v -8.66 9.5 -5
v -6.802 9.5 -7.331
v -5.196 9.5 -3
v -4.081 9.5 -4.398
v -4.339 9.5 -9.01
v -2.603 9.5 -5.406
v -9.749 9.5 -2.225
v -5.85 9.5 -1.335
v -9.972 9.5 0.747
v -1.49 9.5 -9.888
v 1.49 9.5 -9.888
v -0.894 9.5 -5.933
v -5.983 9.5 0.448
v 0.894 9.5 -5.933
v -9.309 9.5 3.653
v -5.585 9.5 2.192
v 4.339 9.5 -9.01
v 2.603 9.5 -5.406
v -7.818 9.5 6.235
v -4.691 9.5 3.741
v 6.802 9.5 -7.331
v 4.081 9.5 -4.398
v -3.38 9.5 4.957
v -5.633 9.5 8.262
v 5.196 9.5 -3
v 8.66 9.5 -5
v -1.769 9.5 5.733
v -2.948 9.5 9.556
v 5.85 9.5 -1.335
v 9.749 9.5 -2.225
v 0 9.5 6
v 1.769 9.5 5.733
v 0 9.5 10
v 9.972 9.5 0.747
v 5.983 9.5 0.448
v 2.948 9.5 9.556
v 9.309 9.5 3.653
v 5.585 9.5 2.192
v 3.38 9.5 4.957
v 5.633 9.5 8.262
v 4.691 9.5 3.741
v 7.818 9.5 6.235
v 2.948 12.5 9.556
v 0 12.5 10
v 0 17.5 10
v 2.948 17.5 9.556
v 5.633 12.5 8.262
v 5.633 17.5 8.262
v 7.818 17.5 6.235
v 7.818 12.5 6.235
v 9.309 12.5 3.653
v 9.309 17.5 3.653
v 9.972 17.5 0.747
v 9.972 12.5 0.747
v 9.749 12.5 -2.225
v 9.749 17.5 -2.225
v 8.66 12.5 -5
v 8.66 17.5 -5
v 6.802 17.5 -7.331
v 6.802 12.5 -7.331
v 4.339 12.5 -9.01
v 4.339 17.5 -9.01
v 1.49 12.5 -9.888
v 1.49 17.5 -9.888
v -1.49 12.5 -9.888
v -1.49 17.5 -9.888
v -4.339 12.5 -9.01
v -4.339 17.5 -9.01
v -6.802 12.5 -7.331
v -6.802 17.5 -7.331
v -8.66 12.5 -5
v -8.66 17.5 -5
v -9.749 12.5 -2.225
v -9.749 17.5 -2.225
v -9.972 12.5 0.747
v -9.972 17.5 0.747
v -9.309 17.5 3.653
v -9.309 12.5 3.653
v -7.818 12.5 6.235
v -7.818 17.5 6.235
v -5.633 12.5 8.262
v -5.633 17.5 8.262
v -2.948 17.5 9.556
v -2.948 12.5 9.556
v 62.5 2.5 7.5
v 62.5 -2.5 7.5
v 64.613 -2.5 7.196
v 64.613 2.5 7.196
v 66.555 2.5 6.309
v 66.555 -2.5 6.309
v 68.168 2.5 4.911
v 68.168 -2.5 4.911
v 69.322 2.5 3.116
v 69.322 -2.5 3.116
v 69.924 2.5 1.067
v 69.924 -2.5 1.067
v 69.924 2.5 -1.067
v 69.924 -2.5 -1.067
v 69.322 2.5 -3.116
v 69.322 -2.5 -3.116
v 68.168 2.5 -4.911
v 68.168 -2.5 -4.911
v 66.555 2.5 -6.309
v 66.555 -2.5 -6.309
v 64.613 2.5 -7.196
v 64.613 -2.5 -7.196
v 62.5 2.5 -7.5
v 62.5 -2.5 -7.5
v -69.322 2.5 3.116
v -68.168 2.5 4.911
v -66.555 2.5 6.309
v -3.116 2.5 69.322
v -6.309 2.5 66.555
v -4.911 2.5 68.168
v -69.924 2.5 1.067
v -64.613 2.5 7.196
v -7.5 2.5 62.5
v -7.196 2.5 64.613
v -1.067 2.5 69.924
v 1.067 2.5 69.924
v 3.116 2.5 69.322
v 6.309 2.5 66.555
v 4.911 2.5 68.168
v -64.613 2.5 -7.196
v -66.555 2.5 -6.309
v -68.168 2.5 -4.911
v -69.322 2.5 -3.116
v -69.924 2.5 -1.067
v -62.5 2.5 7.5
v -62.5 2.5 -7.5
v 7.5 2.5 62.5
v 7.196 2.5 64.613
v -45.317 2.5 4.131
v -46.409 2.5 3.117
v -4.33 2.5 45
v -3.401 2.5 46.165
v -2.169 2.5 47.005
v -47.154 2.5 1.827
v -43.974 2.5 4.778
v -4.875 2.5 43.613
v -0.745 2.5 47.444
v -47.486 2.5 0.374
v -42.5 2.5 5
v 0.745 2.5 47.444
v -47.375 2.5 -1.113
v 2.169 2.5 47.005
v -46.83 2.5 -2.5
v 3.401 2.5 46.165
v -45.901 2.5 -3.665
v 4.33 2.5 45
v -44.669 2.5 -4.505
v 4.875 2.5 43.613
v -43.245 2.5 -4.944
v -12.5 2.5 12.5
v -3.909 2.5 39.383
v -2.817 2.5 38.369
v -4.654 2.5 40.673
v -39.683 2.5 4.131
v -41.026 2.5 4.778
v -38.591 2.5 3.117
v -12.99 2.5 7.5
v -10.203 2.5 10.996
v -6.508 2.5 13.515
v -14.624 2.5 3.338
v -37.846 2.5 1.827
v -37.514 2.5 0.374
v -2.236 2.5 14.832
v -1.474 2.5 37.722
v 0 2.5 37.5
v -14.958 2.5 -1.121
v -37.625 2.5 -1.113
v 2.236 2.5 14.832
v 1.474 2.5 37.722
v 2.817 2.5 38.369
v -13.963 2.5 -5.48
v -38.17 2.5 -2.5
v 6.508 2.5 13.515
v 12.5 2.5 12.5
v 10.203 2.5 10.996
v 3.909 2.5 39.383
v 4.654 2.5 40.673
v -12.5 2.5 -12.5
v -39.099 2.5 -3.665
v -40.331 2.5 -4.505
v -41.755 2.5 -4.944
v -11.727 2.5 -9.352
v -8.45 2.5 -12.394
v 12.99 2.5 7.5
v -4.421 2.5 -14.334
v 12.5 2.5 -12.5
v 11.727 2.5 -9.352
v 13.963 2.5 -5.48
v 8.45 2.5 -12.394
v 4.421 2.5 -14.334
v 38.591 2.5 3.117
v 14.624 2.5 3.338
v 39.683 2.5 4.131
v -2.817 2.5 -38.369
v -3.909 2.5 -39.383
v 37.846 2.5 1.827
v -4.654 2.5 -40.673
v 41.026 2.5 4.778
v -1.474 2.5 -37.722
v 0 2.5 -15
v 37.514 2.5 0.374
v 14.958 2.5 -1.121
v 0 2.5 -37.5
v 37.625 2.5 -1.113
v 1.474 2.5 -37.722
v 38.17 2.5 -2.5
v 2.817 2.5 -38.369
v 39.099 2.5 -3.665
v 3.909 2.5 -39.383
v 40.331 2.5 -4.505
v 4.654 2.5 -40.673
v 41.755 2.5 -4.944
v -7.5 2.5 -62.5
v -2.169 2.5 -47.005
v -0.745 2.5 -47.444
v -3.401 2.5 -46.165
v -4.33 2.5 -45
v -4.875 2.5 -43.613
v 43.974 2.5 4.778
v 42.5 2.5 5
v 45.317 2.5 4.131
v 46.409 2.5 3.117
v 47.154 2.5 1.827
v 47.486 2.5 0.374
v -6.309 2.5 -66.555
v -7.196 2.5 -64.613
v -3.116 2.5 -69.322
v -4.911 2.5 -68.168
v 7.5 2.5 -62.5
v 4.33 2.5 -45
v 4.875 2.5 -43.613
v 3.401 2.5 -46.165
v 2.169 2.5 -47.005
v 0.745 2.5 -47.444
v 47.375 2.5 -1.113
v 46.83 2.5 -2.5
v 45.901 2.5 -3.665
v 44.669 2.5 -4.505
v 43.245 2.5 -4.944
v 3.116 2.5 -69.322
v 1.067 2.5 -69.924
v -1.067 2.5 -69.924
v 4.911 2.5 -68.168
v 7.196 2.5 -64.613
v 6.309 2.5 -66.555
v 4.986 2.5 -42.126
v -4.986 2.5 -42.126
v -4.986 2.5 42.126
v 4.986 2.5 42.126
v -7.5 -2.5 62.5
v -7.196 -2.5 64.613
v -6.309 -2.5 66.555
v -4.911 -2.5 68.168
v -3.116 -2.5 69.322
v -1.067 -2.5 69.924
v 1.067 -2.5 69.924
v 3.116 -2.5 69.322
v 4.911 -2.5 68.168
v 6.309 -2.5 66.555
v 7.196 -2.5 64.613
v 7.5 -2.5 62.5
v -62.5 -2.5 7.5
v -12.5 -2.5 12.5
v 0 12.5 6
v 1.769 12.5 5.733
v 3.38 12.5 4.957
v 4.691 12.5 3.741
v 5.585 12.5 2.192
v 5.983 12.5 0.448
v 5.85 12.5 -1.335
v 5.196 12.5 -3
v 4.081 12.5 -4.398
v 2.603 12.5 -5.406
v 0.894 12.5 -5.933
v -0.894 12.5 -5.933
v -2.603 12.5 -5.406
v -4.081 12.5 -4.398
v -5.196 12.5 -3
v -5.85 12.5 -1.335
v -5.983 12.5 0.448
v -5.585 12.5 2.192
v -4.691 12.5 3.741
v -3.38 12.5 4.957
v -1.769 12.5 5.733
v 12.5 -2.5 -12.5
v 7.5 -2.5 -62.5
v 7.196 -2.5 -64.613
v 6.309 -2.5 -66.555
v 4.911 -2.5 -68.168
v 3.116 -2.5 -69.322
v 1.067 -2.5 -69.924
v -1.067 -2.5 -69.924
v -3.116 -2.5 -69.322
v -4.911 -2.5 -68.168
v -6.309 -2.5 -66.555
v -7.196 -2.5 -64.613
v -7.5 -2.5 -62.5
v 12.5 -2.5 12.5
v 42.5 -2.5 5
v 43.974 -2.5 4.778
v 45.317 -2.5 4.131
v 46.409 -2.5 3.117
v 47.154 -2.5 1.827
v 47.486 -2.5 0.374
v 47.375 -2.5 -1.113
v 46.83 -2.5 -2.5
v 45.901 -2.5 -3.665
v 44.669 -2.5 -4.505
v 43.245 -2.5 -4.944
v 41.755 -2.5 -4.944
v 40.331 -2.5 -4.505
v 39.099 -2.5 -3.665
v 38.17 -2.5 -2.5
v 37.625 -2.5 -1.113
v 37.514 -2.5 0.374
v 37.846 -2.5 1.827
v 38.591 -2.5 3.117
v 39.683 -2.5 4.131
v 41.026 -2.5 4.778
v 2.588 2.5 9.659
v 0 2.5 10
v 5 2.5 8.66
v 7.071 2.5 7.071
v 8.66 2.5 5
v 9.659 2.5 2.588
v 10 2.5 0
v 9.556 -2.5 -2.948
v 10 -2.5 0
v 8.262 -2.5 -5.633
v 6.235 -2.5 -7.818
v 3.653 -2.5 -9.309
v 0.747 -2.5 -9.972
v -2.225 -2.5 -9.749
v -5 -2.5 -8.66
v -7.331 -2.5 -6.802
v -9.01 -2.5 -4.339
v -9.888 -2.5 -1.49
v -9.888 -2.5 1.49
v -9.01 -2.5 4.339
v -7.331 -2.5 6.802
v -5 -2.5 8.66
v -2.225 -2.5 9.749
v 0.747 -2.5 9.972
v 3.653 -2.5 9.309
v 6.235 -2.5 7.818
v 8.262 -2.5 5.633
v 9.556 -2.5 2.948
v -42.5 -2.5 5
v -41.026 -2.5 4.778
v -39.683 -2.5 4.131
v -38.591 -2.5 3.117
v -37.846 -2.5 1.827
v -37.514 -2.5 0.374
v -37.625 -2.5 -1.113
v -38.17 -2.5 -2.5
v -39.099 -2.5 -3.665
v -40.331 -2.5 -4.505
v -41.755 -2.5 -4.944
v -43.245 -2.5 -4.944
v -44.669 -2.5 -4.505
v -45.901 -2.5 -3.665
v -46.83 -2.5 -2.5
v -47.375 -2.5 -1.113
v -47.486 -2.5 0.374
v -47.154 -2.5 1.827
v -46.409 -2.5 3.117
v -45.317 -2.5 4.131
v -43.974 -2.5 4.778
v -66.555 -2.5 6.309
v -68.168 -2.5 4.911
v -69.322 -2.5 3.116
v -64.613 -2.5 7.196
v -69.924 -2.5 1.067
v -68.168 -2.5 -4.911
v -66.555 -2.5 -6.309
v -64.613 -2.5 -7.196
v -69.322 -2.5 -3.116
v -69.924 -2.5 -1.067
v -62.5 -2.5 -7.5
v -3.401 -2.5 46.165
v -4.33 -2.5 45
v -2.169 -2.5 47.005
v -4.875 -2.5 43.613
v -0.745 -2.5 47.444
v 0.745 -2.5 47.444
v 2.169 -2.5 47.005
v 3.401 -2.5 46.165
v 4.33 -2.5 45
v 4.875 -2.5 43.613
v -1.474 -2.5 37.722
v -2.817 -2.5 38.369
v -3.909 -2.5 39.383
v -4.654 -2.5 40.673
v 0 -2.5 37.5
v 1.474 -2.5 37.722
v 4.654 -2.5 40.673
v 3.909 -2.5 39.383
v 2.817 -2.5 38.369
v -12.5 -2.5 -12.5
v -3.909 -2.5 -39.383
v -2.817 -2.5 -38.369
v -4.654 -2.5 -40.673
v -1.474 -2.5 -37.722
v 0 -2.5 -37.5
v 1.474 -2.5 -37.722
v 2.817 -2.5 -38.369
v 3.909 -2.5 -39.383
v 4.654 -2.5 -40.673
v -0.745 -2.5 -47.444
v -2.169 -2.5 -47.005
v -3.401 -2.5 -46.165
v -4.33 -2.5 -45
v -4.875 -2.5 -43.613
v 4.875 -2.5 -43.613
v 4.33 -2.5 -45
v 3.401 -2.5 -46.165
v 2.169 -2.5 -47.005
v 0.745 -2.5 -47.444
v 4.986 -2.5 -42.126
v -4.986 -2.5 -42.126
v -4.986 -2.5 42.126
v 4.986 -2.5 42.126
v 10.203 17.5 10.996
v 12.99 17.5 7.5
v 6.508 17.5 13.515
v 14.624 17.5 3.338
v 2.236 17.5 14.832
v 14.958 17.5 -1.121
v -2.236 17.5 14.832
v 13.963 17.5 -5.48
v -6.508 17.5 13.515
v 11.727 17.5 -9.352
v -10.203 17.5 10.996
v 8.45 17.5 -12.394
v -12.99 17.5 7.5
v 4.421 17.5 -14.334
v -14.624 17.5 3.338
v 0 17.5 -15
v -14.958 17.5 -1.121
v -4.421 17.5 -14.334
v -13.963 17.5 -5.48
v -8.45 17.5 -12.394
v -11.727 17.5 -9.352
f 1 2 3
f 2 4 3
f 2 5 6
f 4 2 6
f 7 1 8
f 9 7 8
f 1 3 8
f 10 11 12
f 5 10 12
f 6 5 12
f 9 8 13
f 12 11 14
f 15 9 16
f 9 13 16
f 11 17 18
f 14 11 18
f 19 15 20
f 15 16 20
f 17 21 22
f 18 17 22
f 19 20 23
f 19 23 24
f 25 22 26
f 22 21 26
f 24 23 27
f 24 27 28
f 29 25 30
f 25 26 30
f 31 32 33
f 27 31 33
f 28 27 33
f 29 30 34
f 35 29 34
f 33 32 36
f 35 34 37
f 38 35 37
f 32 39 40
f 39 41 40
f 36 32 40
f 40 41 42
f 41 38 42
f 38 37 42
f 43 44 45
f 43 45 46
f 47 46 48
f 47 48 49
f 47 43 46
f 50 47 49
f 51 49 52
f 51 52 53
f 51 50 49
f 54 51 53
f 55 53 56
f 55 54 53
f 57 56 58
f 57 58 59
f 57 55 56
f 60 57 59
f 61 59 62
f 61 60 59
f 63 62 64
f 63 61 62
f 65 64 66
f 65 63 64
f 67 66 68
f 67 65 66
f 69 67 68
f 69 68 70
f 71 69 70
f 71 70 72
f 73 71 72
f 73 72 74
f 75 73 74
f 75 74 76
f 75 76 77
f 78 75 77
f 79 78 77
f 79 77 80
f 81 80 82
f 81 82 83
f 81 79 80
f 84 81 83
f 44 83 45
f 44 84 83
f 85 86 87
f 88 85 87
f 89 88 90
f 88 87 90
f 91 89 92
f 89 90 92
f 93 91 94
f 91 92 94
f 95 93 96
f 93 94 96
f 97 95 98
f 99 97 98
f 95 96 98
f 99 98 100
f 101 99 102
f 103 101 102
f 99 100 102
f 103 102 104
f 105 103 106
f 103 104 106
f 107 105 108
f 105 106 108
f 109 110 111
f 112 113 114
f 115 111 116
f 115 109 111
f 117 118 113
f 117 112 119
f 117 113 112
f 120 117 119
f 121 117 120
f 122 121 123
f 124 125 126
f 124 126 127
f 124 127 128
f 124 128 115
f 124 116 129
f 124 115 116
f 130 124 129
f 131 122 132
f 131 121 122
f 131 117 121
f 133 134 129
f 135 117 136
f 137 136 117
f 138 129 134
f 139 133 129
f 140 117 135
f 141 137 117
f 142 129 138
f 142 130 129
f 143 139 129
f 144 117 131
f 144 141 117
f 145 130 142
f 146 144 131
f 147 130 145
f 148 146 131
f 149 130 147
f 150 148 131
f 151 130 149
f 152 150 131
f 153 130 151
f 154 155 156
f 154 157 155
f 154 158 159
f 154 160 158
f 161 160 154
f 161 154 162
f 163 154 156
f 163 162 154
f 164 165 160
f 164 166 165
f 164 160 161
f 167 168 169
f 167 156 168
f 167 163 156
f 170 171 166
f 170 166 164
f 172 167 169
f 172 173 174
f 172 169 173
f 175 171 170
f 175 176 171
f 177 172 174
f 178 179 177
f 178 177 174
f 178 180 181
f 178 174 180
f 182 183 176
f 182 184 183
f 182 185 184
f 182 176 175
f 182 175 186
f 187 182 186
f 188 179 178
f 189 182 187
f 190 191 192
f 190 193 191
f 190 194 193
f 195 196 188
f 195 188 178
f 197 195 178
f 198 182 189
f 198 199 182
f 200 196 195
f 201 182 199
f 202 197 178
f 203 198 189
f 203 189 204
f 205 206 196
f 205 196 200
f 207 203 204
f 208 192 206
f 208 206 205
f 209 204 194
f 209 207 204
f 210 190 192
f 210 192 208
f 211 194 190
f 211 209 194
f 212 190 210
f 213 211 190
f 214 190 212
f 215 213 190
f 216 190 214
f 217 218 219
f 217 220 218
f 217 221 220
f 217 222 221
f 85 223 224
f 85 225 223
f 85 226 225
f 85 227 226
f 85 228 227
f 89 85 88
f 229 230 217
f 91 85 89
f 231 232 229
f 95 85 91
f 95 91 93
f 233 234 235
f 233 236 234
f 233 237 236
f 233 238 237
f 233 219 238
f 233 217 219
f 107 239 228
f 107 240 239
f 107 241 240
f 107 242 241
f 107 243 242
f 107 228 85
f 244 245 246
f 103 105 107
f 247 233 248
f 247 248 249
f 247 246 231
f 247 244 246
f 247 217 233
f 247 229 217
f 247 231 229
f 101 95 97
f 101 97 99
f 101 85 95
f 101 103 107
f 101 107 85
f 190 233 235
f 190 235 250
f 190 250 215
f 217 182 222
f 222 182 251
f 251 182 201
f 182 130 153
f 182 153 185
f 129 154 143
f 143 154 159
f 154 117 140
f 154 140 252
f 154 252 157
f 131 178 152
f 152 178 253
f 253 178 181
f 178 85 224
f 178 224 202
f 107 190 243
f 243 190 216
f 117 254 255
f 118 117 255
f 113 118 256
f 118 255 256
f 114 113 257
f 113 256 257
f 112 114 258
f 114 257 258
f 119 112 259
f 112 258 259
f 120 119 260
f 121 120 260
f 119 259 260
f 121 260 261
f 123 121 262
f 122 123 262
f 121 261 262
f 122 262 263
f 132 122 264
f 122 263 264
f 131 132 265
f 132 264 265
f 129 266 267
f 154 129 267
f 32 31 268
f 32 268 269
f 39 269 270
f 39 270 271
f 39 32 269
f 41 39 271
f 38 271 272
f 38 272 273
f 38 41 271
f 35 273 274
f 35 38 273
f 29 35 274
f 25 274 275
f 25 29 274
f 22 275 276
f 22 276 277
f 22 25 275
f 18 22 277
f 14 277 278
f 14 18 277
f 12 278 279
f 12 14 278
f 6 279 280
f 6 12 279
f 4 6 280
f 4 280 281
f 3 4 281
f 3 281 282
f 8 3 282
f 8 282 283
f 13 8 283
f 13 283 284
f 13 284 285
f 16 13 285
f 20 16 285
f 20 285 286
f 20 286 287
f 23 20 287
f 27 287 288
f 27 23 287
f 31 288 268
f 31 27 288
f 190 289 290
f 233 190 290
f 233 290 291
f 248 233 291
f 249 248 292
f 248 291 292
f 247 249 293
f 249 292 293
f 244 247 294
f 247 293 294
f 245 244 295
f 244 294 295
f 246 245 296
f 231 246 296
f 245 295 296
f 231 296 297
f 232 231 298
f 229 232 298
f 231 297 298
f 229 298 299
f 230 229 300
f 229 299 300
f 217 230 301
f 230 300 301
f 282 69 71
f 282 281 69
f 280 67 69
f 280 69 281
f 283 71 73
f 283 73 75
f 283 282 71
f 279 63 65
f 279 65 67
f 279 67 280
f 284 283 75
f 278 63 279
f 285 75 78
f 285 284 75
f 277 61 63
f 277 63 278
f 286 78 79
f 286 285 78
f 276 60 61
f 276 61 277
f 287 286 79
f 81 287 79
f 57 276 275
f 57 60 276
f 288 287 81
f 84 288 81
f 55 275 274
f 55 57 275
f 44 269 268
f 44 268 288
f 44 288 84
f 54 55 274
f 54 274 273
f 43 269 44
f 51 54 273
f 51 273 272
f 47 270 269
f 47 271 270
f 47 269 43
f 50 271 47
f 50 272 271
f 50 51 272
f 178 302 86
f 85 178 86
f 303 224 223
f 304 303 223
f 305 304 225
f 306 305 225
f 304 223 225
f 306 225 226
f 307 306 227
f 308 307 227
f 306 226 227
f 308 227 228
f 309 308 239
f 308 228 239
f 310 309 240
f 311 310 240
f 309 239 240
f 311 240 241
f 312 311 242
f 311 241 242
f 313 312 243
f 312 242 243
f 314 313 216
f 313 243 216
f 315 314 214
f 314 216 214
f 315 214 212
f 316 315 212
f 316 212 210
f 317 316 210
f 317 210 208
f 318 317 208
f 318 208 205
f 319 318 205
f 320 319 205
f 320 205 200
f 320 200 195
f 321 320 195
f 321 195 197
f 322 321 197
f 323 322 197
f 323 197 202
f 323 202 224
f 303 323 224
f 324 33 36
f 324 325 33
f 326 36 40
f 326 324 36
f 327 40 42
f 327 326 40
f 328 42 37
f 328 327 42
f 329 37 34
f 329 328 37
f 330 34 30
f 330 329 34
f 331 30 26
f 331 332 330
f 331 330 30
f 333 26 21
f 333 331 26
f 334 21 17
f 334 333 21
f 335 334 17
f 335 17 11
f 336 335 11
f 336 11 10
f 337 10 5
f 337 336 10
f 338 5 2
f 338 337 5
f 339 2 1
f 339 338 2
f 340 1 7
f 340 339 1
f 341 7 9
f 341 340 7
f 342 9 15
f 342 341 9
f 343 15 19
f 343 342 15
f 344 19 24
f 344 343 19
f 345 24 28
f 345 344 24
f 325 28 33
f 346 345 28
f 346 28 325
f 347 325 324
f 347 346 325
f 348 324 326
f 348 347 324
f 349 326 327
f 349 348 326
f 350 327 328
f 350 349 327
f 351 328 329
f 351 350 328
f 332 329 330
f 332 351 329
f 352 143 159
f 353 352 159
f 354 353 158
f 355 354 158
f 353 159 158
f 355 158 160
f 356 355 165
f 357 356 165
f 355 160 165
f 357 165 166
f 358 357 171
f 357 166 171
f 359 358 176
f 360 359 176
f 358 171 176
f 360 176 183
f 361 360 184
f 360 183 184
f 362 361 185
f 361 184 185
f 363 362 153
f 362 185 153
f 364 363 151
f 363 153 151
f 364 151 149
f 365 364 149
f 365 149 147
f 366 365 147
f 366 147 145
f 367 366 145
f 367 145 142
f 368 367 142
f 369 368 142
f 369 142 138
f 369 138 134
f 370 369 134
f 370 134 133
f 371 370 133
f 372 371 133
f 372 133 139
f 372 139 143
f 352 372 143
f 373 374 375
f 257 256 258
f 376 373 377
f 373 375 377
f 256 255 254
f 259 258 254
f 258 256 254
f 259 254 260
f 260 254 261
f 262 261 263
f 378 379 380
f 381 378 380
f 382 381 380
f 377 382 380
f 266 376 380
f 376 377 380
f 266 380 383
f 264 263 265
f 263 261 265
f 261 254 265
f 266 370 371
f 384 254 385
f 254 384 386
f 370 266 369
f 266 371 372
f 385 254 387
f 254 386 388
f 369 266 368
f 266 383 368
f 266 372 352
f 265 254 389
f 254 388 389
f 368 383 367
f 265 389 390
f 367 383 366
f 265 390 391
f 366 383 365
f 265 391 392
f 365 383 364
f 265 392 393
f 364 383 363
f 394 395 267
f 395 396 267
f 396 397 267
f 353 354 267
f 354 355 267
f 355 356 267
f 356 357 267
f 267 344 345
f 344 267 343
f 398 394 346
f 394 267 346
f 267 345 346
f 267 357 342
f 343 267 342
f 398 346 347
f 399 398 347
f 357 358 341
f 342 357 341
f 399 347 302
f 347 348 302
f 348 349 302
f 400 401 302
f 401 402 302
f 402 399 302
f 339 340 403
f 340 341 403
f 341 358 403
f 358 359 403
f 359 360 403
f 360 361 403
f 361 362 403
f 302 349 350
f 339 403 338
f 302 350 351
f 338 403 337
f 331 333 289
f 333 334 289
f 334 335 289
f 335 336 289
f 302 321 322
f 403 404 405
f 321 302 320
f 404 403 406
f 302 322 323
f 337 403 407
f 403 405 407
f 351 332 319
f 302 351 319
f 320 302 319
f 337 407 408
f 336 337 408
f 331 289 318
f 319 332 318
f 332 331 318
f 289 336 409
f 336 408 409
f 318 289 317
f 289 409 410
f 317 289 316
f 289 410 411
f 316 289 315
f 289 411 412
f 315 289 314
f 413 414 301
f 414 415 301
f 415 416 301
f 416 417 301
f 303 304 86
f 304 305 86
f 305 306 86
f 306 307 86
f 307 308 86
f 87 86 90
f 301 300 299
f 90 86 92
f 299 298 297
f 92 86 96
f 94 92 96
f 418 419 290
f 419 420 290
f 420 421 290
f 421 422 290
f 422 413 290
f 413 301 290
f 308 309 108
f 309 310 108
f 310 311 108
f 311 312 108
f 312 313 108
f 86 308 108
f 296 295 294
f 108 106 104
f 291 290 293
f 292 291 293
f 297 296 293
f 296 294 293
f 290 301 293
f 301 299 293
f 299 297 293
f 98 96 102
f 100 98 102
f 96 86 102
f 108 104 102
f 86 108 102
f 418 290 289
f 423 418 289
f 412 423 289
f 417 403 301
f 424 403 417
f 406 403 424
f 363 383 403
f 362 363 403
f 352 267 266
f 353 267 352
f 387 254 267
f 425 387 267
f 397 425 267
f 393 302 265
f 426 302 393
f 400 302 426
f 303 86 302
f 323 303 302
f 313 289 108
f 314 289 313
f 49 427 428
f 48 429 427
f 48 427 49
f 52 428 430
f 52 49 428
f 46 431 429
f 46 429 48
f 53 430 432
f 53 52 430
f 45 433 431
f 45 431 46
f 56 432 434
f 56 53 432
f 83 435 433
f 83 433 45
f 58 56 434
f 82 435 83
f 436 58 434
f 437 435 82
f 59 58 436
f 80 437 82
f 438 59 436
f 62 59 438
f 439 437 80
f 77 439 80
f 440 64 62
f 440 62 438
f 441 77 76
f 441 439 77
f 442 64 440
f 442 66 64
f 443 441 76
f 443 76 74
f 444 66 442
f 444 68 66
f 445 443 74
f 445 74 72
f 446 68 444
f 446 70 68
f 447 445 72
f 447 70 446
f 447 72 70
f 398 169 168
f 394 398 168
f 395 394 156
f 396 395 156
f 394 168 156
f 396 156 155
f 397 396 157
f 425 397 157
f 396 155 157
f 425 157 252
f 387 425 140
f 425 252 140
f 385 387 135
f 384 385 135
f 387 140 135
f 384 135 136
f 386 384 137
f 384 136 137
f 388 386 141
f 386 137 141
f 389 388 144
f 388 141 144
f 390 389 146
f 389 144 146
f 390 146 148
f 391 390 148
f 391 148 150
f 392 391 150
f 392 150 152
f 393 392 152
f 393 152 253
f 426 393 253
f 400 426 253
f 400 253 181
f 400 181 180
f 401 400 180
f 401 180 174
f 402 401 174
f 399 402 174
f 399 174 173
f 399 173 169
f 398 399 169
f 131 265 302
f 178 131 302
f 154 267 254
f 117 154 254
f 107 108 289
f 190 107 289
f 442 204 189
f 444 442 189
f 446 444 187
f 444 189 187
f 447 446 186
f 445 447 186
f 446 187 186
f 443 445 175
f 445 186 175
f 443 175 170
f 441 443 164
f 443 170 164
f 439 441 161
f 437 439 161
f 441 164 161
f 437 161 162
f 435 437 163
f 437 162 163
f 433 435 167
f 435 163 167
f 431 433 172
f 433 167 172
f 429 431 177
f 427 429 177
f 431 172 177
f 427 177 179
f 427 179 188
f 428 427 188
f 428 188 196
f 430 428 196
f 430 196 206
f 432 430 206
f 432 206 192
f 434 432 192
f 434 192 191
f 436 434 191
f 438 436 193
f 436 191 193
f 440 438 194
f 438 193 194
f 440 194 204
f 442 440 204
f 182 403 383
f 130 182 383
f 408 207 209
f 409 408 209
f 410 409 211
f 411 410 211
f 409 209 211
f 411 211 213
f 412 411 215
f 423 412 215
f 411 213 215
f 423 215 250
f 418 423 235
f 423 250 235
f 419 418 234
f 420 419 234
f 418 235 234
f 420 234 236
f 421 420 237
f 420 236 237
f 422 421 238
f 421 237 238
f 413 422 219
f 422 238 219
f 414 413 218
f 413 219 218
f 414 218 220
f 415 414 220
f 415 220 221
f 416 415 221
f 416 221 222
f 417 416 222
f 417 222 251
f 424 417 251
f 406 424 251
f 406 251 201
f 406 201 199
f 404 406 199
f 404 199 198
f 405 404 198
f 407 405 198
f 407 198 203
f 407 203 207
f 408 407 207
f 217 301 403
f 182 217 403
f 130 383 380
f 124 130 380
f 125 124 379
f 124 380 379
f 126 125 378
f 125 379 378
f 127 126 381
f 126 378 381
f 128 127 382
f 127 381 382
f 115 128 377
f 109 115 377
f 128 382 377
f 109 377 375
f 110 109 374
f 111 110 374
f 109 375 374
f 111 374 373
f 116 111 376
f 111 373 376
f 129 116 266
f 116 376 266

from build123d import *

# Parameters (mm, degrees)
BOSS_EXTRUDE1_START     = -2.5
BOSS_EXTRUDE1_OUTLINE_R = 10
BOSS_EXTRUDE1_DEPTH     = 5
SKETCH2_R               = 15
SKETCH2_R_2             = 10
BOSS_EXTRUDE2_DEPTH     = 15
SKETCH3_R               = 5
CUT_EXTRUDE1_DEPTH      = 101.124921973
BOSS_EXTRUDE3_START     = 9.5
SKETCH4_R               = 10
SKETCH4_R_2             = 6
BOSS_EXTRUDE3_DEPTH     = 3


# Read off the part's stored shape, not the designer's step: Boss-Extrude1
with BuildPart() as part:
    # Boss-Extrude1 outline → Boss-Extrude1 (new body)
    with BuildSketch(Plane(origin=(0, 0, 0), x_dir=(1, 0, 0), z_dir=(0, 1, 0)).offset(BOSS_EXTRUDE1_START)):
        with BuildLine():
            Line((12.5, 12.5), (7.5, 62.5))
            ThreePointArc((7.5, 62.5), (0, 70), (-7.5, 62.5))
            Line((-7.5, 62.5), (-12.5, 12.5))
            Line((-12.5, 12.5), (-62.5, 7.5))
            ThreePointArc((-62.5, 7.5), (-70, 0), (-62.5, -7.5))
            Line((-62.5, -7.5), (-12.5, -12.5))
            Line((-12.5, -12.5), (-7.5, -62.5))
            ThreePointArc((-7.5, -62.5), (0, -70), (7.5, -62.5))
            Line((7.5, -62.5), (12.5, -12.5))
            Line((12.5, -12.5), (62.5, -7.5))
            ThreePointArc((62.5, -7.5), (70, 0), (62.5, 7.5))
            Line((62.5, 7.5), (12.5, 12.5))
        make_face()
        Circle(BOSS_EXTRUDE1_OUTLINE_R, mode=Mode.SUBTRACT)
    extrude(amount=BOSS_EXTRUDE1_DEPTH)

    # Sketch2 → Boss-Extrude2 (add)
    with BuildSketch(Plane(origin=(0, 2.5, 0), x_dir=(1, 0, 0), z_dir=(0, 1, 0))):
        with Locations(Location((0, 0, 0), (0, 0, 90))):
            Circle(SKETCH2_R)
        with Locations(Location((0, 0, 0), (0, 0, 270))):
            Circle(SKETCH2_R_2, mode=Mode.SUBTRACT)
    extrude(amount=BOSS_EXTRUDE2_DEPTH)

    # Sketch3 → Cut-Extrude1 (cut, through all)
    with BuildSketch(Plane(origin=(0, 2.5, 0), x_dir=(1, 0, 0), z_dir=(0, 1, 0))):
        with Locations(Location((42.5, 0, 0), (0, 0, 270))):
            Circle(SKETCH3_R)
        with Locations(Location((-42.5, 0, 0), (0, 0, 270))):
            Circle(SKETCH3_R)
        with Locations(Location((0, 42.5, 0), (0, 0, 270))):
            Circle(SKETCH3_R)
        with Locations(Location((0, -42.5, 0), (0, 0, 90))):
            Circle(SKETCH3_R)
    extrude(amount=-CUT_EXTRUDE1_DEPTH, mode=Mode.SUBTRACT)

    # Sketch4 → Boss-Extrude3 (add)
    with BuildSketch(Plane(origin=(0, 0, 0), x_dir=(1, 0, 0), z_dir=(0, 1, 0)).offset(BOSS_EXTRUDE3_START)):
        with Locations(Location((0, 0, 0), (0, 0, 270))):
            Circle(SKETCH4_R)
        with Locations(Location((0, 0, 0), (0, 0, 270))):
            Circle(SKETCH4_R_2, mode=Mode.SUBTRACT)
    extrude(amount=BOSS_EXTRUDE3_DEPTH)


solid = part.part
